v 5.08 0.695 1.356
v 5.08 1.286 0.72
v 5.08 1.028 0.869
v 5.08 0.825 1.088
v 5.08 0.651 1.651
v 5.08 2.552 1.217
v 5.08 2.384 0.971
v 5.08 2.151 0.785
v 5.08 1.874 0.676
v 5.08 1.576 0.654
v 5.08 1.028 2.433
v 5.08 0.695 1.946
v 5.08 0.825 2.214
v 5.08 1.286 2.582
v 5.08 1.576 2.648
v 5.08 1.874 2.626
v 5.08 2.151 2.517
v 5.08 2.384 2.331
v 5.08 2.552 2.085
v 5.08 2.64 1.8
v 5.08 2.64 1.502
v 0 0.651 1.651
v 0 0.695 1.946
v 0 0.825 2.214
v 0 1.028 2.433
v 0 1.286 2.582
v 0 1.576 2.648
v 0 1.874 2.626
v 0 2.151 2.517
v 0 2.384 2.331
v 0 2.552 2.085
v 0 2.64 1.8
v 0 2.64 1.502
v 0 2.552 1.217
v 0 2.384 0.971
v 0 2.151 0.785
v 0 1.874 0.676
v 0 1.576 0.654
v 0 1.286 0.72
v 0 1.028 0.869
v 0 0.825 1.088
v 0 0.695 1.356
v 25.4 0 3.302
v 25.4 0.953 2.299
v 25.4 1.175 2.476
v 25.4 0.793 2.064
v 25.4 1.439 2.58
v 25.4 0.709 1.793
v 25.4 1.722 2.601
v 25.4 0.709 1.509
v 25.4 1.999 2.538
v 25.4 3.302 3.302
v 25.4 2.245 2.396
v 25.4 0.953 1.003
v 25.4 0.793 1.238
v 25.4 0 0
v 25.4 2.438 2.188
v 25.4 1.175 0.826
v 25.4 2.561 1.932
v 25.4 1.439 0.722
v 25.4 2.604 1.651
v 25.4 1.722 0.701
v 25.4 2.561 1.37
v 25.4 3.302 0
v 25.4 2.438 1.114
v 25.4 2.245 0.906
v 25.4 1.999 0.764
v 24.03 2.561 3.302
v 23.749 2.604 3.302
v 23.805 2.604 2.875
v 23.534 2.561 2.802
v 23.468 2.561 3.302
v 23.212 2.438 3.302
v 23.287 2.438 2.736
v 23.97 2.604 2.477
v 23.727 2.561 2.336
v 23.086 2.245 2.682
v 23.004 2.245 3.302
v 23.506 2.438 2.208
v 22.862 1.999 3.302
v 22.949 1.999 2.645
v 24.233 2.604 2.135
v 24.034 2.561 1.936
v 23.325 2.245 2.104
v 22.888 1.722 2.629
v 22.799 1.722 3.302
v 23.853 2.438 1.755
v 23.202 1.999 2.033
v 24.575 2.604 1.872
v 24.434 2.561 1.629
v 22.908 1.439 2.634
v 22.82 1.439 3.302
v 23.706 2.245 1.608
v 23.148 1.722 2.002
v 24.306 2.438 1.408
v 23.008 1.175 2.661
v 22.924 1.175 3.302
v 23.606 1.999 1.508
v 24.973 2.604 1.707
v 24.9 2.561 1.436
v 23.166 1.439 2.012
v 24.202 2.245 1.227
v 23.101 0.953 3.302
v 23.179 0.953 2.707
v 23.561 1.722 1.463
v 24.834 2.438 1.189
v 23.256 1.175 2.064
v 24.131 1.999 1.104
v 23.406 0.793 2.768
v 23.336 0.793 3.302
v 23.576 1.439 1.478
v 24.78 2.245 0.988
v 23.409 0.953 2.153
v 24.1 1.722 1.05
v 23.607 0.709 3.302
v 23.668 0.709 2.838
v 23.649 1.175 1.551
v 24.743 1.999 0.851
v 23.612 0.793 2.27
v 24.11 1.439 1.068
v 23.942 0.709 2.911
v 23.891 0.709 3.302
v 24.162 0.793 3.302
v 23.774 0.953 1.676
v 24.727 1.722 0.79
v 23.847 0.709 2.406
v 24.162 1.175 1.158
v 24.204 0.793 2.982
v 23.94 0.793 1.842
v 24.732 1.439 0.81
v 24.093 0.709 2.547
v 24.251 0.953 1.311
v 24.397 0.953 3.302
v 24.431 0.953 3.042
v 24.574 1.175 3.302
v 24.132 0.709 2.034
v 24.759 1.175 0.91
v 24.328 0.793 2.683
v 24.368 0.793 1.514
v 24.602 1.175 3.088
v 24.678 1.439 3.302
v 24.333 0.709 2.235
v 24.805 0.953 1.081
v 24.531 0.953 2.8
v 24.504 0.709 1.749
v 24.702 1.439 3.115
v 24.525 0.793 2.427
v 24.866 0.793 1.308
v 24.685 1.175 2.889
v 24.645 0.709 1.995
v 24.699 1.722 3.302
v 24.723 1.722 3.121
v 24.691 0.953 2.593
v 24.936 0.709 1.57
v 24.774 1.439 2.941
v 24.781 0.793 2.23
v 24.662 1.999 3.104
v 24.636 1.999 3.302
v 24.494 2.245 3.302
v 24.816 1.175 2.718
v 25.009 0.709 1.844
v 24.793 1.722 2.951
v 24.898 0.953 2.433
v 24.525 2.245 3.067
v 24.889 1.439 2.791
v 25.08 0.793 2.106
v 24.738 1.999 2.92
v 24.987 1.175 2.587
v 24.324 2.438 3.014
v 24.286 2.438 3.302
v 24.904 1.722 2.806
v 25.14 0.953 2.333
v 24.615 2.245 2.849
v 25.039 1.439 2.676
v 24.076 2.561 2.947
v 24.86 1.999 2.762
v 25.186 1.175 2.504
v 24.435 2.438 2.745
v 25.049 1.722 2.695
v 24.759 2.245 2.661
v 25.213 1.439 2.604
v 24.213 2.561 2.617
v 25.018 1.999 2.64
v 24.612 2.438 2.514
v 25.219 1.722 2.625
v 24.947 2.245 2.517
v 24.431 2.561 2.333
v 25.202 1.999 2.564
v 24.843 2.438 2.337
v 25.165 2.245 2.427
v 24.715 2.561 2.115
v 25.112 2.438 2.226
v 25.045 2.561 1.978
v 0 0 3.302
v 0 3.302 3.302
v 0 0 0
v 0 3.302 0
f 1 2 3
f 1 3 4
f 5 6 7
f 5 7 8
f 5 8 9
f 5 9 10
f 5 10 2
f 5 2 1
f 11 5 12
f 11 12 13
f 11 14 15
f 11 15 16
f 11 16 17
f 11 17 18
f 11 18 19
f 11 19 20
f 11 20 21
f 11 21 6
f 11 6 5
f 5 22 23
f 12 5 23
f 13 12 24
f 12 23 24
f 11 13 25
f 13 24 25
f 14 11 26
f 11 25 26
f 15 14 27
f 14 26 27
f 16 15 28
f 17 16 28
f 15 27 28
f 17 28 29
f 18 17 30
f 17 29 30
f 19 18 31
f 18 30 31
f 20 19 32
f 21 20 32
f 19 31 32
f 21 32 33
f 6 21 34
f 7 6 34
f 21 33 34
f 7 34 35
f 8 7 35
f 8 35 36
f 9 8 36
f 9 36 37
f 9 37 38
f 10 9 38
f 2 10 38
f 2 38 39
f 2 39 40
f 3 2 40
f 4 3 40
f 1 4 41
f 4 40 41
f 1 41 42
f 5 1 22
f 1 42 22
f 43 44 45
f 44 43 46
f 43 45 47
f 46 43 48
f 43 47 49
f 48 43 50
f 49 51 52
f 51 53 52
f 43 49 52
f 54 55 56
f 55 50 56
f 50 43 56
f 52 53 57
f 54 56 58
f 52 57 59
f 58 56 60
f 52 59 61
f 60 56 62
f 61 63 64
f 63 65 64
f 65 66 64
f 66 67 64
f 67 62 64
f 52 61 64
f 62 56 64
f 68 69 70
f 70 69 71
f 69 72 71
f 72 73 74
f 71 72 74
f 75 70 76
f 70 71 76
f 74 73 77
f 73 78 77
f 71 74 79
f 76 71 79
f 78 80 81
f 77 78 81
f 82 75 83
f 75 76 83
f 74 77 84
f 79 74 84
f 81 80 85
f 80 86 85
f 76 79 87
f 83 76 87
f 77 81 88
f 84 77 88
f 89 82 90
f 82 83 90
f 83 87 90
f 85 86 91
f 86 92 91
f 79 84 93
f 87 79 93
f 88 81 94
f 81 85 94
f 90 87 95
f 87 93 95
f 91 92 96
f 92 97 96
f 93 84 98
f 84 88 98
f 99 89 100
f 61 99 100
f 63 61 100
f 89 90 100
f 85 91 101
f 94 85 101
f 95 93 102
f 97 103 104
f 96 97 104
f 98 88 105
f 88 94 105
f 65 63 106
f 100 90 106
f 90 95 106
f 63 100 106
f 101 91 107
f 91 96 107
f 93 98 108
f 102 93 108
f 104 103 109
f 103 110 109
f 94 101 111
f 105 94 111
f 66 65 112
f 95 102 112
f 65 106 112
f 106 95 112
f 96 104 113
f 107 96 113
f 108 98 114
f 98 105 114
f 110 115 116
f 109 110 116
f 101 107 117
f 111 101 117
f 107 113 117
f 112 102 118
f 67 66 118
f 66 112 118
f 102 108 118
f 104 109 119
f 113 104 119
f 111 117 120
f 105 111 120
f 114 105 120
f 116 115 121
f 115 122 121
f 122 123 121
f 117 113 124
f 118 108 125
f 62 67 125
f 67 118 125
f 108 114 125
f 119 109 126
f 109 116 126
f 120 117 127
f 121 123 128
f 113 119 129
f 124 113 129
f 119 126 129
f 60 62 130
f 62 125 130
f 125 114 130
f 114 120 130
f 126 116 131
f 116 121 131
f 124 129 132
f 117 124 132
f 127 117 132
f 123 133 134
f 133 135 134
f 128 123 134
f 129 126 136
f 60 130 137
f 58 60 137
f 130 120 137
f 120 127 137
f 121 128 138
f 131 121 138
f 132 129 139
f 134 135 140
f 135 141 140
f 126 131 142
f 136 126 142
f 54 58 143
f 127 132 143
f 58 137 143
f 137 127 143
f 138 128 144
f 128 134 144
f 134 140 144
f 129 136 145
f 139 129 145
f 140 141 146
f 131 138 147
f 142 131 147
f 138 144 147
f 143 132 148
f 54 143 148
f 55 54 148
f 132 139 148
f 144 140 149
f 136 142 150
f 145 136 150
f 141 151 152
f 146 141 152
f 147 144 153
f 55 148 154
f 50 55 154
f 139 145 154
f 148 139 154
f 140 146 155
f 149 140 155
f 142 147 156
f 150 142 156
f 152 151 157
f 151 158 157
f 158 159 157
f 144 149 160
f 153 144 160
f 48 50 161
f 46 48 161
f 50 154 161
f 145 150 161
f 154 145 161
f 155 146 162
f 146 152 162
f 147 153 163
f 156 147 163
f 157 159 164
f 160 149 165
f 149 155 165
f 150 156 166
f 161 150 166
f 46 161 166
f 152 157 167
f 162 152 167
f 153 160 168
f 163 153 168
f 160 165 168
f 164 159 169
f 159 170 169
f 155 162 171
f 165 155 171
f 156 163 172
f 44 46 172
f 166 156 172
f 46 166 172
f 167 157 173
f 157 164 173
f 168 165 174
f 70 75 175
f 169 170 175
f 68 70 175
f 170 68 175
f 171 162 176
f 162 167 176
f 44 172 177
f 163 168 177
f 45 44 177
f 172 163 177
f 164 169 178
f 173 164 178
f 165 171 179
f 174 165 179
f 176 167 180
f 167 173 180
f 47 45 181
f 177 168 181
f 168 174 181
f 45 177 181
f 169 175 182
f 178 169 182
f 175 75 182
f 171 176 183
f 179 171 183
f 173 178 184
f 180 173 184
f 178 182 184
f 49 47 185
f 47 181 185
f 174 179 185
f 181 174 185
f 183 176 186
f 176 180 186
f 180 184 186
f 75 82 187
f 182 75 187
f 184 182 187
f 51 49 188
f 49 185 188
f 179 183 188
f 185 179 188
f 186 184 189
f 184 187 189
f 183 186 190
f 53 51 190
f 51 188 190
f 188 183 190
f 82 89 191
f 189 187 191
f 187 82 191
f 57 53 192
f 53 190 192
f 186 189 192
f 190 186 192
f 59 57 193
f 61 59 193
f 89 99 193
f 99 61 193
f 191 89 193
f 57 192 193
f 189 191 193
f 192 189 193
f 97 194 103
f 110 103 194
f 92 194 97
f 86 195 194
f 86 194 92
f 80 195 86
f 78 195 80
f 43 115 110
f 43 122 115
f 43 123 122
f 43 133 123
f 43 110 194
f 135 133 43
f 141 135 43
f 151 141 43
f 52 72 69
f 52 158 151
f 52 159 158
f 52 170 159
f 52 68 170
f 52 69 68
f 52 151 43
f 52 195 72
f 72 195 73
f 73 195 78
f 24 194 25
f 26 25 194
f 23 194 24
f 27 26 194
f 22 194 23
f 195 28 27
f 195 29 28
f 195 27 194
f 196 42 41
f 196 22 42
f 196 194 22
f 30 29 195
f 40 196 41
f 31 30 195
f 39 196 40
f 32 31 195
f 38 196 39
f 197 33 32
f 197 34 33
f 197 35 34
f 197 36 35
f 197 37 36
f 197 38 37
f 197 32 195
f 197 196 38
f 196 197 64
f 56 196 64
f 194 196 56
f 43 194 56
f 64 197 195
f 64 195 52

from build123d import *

# Parameters (mm, degrees)
F0_W     = 25.4
F0_H     = 3.302
F1_DEPTH = 3.302
F2_R     = 1
F3_DEPTH = 5.08
F4_R     = 0.9525


with BuildPart() as f1:
    # F0 (on Top) → F1 (new body)
    with BuildSketch(Plane.XY):
        with Locations((12.7, 1.651)):
            Rectangle(F0_W, F0_H)
    extrude(amount=F1_DEPTH)

    # F2 (on face) → F3 (cut)
    with BuildSketch(Plane(origin=(0, 0, 0), x_dir=(0, -1, 0), z_dir=(-1, 0, 0))):
        with Locations((-1.651, 1.651)):
            Circle(F2_R)
    extrude(amount=-F3_DEPTH, mode=Mode.SUBTRACT)

    # F7: sweep along a path in F6
    with BuildLine(Plane.XZ.offset(-1.651)) as f7_path:
        ThreePointArc((23.749, 3.302), (24.2325667043, 2.1345667043), (25.4, 1.651))
    # F4 (on face) → F7 (sweep, cut)
    with BuildSketch(Plane.YZ.offset(25.4)):
        with Locations((1.651, 1.651)):
            Circle(F4_R)
    sweep(path=f7_path.line, mode=Mode.SUBTRACT)


solid = f1.part
